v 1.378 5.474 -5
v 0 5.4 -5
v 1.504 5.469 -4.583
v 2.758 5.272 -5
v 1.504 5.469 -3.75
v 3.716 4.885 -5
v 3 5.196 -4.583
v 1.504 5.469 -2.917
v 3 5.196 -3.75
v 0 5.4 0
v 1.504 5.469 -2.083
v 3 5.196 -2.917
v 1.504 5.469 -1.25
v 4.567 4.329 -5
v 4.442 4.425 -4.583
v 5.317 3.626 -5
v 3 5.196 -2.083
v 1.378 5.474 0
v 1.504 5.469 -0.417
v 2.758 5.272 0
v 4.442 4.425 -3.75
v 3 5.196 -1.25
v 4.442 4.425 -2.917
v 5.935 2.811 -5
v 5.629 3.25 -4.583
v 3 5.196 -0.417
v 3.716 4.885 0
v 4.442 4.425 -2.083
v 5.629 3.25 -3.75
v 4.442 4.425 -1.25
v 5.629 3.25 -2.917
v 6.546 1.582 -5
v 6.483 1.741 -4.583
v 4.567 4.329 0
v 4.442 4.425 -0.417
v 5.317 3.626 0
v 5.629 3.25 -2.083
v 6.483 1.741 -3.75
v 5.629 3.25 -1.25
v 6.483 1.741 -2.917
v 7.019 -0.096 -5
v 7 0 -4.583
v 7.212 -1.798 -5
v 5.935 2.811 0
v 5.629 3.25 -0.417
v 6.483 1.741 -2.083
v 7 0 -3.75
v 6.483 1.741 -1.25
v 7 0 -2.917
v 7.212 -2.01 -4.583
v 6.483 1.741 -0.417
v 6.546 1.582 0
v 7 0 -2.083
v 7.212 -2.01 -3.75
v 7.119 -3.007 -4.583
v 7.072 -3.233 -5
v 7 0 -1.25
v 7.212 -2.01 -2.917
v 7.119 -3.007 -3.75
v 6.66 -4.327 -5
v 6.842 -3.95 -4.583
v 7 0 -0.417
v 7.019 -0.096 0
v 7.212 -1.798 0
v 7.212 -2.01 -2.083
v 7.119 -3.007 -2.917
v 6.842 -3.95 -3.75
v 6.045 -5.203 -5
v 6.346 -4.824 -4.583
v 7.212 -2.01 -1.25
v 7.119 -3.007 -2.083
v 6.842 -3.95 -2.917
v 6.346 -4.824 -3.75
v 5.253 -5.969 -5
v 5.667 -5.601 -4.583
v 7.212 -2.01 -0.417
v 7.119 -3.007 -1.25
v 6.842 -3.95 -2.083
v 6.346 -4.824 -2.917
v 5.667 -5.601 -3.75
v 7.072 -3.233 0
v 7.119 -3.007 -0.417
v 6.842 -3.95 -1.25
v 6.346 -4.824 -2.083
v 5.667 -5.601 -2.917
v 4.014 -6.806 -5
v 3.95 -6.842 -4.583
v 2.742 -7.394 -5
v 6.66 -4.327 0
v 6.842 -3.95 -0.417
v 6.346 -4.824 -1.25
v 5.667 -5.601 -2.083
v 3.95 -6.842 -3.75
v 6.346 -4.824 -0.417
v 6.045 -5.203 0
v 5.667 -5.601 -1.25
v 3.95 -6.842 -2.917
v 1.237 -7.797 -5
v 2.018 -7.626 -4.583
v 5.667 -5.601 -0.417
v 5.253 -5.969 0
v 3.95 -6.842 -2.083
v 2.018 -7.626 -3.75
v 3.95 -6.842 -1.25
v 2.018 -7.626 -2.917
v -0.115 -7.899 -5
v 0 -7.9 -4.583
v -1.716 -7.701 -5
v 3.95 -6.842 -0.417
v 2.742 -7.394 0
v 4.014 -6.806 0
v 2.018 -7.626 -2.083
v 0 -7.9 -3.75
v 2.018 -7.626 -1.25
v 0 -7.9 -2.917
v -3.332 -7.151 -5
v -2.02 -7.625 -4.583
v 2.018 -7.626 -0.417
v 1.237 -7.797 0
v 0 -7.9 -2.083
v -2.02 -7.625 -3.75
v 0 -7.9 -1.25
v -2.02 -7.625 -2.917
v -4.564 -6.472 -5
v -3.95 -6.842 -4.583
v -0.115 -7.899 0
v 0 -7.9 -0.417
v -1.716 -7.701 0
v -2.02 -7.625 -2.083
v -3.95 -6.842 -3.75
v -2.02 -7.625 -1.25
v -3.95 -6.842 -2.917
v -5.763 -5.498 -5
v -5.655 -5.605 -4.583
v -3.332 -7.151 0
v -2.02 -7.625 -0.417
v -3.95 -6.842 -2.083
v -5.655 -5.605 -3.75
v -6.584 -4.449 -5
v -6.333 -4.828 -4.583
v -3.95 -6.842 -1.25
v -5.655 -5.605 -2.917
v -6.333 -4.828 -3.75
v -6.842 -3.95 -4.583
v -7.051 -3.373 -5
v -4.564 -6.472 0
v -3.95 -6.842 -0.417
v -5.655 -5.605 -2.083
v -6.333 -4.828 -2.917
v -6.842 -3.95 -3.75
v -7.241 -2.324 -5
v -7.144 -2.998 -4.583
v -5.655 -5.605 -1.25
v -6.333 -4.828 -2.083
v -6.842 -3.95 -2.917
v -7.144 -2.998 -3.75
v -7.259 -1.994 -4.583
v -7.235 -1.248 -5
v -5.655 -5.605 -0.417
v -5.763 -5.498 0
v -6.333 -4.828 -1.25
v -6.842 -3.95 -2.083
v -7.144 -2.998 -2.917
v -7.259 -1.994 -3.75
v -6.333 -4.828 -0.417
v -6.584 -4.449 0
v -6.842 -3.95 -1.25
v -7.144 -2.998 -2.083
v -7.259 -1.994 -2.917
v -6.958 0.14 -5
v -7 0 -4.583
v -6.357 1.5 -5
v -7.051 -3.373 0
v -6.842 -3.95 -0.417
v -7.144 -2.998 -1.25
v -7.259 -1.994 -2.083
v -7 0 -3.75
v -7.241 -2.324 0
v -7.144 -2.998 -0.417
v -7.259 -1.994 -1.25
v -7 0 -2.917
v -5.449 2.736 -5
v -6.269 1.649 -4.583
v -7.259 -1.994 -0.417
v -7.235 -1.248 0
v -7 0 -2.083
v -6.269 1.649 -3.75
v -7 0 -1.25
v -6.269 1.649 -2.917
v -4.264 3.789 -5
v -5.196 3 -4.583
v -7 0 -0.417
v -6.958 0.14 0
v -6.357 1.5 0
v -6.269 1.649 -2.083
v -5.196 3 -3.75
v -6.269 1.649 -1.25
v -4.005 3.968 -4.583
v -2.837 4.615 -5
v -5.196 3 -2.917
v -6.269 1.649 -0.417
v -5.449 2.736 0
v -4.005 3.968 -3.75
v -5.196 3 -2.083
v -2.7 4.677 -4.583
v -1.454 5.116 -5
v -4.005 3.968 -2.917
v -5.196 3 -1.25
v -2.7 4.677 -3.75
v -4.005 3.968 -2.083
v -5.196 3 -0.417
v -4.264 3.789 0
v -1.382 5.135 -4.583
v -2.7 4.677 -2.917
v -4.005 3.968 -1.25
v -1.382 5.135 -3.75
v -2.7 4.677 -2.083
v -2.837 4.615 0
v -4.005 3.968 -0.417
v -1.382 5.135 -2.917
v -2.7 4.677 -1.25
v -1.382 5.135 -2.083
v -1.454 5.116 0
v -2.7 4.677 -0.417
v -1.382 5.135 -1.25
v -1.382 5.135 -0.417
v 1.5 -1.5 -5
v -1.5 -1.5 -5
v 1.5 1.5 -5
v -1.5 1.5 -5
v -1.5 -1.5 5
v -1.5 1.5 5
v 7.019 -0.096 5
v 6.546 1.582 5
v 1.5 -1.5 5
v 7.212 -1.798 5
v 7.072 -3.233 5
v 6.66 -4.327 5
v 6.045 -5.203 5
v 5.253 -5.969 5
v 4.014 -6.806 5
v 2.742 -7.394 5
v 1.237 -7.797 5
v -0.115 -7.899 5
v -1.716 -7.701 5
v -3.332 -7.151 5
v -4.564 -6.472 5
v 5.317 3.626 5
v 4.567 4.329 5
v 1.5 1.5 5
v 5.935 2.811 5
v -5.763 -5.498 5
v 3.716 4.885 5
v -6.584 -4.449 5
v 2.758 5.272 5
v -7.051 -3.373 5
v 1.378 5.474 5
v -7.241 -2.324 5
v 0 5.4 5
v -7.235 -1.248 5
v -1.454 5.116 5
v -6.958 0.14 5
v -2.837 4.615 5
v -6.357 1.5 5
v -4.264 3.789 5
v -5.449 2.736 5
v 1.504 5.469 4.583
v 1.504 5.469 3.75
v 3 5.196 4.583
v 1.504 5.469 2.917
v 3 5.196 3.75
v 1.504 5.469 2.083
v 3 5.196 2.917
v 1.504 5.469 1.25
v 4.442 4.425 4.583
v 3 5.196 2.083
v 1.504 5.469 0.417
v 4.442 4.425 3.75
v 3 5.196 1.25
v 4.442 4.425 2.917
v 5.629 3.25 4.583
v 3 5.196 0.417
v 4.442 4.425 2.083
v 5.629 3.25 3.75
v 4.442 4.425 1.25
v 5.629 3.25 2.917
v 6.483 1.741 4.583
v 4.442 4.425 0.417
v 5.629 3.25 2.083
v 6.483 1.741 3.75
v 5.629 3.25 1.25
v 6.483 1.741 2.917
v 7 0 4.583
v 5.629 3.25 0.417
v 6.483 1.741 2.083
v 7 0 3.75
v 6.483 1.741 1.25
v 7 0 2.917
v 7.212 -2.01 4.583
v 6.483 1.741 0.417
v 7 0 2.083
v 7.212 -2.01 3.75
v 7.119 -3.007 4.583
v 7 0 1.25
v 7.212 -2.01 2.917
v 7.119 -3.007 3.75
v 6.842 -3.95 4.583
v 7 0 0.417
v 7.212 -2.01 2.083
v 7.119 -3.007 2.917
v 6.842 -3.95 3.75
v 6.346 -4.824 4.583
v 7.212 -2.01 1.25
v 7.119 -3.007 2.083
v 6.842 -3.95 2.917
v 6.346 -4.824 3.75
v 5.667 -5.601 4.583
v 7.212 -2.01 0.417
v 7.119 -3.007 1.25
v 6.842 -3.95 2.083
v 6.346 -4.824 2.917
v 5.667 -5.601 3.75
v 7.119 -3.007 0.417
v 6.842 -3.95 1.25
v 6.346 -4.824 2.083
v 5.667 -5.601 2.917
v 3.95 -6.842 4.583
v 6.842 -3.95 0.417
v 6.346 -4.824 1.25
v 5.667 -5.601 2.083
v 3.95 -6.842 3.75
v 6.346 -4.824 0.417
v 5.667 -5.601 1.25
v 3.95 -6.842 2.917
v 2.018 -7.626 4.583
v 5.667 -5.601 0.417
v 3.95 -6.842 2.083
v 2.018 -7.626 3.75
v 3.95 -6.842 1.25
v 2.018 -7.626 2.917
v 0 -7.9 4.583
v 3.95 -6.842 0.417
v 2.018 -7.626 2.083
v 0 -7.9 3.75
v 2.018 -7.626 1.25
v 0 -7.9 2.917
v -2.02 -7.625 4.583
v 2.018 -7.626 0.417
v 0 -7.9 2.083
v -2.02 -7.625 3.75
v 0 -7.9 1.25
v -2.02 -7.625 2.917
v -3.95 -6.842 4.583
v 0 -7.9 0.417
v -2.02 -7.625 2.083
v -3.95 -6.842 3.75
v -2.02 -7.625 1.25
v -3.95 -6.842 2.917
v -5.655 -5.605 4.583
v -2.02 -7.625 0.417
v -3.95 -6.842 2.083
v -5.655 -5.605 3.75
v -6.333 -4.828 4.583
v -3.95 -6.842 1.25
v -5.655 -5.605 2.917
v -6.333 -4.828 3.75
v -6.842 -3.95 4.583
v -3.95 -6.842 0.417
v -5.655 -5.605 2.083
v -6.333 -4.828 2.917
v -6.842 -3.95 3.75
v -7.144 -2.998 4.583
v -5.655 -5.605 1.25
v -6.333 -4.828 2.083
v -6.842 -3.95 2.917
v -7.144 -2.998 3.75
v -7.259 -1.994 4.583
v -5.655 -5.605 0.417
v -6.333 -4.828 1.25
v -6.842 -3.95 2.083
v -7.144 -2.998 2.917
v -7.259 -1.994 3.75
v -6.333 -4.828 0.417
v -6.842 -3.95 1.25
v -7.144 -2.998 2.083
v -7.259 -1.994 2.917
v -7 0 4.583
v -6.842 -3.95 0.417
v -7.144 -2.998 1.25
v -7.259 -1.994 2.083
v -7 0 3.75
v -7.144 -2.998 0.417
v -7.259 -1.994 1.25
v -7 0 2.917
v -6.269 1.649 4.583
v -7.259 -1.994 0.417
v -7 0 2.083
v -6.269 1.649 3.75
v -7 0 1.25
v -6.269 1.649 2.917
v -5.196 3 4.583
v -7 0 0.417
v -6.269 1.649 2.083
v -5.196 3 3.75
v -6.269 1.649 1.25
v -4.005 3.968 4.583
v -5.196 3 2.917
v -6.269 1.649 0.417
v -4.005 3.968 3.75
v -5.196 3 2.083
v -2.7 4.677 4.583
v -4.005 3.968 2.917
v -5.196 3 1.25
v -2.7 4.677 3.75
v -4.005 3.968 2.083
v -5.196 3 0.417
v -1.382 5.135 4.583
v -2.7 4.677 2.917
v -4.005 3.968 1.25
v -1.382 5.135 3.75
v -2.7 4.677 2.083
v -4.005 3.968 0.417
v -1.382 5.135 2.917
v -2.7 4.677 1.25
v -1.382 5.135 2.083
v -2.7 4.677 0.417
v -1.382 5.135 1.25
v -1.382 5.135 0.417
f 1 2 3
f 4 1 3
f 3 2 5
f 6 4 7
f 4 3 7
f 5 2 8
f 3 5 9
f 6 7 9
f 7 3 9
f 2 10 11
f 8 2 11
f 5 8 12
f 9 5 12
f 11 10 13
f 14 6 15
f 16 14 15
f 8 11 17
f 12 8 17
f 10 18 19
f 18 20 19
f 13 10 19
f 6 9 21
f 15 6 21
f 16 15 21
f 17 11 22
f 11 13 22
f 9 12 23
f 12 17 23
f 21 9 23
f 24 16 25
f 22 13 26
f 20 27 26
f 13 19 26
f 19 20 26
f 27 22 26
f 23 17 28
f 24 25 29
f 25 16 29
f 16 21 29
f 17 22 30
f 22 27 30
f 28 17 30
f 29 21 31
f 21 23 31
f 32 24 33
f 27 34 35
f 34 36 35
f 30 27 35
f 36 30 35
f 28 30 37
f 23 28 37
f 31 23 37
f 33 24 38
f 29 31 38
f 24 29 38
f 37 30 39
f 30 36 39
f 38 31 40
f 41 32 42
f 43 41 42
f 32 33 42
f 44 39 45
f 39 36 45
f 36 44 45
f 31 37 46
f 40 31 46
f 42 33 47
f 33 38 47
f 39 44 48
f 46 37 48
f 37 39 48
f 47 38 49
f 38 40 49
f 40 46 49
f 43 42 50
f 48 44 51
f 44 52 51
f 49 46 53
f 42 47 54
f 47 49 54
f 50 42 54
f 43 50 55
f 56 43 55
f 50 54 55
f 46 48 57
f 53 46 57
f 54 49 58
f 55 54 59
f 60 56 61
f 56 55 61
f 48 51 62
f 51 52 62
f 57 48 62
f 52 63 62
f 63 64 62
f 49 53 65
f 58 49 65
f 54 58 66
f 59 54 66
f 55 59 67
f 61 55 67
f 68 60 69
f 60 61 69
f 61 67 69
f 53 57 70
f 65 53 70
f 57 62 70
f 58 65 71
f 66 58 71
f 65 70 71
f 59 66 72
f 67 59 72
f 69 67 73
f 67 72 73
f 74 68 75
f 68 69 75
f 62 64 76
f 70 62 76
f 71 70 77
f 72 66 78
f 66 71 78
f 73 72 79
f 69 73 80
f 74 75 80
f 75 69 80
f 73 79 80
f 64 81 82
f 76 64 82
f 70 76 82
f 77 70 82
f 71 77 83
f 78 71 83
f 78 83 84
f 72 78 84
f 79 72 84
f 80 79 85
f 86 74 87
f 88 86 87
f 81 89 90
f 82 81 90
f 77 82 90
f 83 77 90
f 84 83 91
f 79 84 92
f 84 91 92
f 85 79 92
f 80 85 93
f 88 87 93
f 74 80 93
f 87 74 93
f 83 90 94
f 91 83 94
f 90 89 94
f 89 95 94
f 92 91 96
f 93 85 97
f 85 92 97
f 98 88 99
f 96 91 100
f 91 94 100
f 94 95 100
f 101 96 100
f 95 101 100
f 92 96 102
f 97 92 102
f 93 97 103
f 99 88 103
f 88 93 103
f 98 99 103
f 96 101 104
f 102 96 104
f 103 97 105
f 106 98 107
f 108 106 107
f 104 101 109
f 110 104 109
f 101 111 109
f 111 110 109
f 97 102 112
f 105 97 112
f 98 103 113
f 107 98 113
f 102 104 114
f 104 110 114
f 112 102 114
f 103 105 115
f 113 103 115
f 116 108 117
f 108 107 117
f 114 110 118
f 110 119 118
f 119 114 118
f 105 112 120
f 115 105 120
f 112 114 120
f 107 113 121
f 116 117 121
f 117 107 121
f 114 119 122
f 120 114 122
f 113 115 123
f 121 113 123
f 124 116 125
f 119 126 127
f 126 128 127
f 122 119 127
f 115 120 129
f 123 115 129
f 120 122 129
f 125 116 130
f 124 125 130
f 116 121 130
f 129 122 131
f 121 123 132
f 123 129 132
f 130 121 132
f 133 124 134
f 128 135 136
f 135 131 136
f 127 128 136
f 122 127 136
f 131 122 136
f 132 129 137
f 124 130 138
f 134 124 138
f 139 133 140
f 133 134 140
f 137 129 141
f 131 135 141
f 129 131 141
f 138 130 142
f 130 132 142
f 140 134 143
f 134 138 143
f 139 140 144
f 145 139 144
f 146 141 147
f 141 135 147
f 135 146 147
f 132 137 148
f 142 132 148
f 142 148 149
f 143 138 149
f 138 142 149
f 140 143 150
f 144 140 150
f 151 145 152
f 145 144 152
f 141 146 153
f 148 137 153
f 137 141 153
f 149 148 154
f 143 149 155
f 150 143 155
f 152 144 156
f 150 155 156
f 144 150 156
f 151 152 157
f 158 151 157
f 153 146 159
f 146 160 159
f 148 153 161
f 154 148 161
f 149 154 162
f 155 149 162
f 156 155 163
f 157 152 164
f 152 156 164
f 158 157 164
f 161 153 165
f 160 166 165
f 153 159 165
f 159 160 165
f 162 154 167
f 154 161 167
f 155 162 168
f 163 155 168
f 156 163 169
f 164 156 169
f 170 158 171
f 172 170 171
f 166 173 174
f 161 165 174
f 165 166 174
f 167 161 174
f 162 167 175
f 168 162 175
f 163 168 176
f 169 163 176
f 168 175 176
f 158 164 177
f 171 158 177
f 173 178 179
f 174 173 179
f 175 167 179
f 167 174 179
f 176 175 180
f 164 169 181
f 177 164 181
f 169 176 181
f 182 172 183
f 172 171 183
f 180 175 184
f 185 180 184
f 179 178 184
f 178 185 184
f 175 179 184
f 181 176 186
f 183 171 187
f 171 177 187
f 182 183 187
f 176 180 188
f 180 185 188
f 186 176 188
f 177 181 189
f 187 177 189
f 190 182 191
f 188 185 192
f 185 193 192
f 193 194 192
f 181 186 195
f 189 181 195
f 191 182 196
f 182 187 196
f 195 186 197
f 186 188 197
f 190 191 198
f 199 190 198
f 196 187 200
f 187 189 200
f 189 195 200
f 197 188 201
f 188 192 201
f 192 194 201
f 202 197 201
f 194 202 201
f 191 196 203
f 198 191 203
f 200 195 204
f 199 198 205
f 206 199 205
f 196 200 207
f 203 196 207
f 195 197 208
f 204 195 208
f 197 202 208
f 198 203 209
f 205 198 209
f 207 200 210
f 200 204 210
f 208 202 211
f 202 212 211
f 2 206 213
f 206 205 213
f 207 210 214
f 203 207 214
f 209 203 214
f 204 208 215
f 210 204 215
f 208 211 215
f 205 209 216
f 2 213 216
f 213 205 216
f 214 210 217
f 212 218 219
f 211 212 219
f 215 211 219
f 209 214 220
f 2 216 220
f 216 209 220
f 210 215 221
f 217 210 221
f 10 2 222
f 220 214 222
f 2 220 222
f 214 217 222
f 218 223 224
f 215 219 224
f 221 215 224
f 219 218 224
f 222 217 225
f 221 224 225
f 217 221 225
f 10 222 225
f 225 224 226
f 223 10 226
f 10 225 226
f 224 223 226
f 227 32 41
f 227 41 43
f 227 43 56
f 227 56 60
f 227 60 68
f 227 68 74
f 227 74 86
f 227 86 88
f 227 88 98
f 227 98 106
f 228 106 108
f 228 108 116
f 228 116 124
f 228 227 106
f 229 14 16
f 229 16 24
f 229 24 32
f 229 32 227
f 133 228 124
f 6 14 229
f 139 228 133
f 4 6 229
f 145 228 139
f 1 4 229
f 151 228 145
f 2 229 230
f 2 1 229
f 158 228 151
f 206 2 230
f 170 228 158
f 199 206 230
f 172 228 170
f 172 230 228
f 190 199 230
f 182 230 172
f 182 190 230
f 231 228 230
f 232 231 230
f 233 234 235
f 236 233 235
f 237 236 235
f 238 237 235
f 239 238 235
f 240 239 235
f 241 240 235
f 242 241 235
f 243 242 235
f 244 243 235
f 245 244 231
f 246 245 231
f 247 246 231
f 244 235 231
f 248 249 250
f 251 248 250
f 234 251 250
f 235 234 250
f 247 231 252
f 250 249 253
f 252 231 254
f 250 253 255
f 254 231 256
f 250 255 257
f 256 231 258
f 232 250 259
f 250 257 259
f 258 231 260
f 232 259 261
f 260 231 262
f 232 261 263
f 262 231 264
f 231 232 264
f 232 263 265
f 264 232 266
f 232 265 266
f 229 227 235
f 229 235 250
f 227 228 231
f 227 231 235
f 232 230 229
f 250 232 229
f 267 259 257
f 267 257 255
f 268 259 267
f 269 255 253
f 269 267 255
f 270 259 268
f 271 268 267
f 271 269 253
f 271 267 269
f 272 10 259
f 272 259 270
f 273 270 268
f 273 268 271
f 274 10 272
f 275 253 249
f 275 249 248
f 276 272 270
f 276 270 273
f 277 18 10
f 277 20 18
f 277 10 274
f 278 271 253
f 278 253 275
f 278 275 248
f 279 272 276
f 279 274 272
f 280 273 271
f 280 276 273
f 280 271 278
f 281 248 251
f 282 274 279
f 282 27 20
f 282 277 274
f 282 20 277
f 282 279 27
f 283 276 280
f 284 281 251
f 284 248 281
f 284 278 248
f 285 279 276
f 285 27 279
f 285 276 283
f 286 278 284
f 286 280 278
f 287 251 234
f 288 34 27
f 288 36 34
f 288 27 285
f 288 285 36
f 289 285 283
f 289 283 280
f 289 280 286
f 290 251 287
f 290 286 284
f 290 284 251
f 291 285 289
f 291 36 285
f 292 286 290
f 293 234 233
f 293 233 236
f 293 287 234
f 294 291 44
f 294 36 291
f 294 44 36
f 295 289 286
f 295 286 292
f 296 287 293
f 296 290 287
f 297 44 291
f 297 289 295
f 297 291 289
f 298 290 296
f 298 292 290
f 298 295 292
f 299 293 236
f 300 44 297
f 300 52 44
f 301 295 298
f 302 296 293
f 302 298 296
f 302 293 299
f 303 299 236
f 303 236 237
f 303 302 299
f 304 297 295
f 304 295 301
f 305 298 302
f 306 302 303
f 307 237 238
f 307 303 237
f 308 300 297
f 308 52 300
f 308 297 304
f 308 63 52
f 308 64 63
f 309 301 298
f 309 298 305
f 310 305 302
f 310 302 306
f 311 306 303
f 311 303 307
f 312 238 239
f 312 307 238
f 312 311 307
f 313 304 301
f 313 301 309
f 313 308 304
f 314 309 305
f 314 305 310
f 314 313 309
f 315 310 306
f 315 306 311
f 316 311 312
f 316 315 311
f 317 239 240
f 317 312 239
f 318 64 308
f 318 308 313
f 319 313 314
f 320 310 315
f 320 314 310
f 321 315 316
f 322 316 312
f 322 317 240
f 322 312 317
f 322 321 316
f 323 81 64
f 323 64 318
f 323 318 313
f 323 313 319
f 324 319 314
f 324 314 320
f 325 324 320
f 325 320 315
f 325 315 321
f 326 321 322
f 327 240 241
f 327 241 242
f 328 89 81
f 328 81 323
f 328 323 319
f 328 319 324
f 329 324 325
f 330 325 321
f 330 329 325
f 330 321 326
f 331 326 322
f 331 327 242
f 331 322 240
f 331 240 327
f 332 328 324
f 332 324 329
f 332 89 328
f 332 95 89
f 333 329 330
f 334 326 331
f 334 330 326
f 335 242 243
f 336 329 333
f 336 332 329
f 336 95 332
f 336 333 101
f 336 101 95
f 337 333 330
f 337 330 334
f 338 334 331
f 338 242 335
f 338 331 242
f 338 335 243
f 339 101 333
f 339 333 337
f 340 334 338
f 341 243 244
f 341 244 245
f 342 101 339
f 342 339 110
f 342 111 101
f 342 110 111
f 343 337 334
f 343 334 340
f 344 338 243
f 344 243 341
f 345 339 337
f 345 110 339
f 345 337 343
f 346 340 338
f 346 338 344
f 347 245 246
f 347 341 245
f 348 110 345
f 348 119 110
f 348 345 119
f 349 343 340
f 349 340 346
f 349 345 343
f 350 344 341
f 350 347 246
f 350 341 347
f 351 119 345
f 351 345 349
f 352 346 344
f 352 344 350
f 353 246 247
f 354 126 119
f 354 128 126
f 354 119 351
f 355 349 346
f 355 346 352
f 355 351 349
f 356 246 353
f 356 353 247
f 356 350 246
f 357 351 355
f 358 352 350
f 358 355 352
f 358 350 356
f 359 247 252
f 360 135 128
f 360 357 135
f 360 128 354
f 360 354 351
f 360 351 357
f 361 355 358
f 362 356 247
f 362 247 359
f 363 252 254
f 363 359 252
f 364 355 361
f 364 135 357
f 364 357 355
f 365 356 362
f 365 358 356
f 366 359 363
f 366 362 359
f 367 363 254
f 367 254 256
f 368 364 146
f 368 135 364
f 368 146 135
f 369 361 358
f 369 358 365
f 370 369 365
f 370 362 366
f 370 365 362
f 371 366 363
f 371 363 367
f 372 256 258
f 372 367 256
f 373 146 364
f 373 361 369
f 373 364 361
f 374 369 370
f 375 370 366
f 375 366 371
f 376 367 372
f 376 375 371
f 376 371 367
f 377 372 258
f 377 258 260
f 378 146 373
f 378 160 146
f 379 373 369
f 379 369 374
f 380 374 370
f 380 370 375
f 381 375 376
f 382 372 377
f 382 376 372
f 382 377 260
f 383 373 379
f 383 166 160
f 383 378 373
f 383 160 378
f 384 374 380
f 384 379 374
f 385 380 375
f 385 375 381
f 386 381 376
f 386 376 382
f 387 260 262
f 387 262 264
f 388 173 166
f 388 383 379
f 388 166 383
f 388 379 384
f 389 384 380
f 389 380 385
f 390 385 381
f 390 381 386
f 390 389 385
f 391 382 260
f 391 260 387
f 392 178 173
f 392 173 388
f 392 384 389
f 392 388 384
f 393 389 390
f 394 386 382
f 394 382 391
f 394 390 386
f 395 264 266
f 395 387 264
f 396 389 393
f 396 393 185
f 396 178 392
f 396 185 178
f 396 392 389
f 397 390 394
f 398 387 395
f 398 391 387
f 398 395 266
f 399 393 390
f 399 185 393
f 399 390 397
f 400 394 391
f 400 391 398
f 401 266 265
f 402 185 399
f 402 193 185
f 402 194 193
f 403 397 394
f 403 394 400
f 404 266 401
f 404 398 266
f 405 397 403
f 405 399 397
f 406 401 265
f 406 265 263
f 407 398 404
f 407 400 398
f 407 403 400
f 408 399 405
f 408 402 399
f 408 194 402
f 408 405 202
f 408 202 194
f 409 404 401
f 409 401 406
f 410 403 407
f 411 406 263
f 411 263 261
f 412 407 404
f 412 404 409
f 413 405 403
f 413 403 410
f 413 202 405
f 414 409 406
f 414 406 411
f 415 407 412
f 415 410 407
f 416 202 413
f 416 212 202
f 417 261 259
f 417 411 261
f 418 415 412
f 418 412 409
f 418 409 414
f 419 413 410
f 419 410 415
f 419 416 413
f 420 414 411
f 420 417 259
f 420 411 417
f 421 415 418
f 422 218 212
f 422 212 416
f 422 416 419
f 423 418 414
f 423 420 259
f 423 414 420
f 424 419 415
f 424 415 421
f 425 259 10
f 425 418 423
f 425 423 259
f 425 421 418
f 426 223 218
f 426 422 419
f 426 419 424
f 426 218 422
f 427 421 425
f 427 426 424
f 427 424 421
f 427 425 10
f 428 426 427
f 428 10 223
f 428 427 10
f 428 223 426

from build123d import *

# Parameters (mm, degrees)
F0_W     = 3
F0_H     = 3
F1_DEPTH = 5


with BuildPart() as f1:
    # F0 (on Top) → F1 (new body, symmetric)
    with BuildSketch(Plane.XY):
        with BuildLine():
            add(Edge.make_bspline(
                [(0, 5.4), (0.9828393456, 5.523251011), (3.1152453507, 5.5343655429), (5.9287574048, 3.3928389205), (7.1886896919, 0.0616891633), (7.4359708845, -4.210376631), (4.0604131185, -7.1442051408), (0.0033785947, -8.2789188865), (-4.0739274974, -7.1401193134), (-7.3890109153, -4.2266056063), (-7.3558997139, 0.1147514575), (-5.3846723817, 3.1441020373), (-2.7626976392, 4.8159756922), (-0.9476146342, 5.2811662738), (0, 5.4)],
                knots=[0, 0, 0, 0, 0.0761781175, 0.1556320872, 0.2381388024, 0.3254846921, 0.4143221509, 0.5031596097, 0.5919970685, 0.6808345272, 0.7681804169, 0.8503739693, 0.9265520868, 1, 1, 1, 1], degree=3))
        make_face()
        Rectangle(F0_W, F0_H, mode=Mode.SUBTRACT)
    extrude(amount=F1_DEPTH, both=True)


solid = f1.part
